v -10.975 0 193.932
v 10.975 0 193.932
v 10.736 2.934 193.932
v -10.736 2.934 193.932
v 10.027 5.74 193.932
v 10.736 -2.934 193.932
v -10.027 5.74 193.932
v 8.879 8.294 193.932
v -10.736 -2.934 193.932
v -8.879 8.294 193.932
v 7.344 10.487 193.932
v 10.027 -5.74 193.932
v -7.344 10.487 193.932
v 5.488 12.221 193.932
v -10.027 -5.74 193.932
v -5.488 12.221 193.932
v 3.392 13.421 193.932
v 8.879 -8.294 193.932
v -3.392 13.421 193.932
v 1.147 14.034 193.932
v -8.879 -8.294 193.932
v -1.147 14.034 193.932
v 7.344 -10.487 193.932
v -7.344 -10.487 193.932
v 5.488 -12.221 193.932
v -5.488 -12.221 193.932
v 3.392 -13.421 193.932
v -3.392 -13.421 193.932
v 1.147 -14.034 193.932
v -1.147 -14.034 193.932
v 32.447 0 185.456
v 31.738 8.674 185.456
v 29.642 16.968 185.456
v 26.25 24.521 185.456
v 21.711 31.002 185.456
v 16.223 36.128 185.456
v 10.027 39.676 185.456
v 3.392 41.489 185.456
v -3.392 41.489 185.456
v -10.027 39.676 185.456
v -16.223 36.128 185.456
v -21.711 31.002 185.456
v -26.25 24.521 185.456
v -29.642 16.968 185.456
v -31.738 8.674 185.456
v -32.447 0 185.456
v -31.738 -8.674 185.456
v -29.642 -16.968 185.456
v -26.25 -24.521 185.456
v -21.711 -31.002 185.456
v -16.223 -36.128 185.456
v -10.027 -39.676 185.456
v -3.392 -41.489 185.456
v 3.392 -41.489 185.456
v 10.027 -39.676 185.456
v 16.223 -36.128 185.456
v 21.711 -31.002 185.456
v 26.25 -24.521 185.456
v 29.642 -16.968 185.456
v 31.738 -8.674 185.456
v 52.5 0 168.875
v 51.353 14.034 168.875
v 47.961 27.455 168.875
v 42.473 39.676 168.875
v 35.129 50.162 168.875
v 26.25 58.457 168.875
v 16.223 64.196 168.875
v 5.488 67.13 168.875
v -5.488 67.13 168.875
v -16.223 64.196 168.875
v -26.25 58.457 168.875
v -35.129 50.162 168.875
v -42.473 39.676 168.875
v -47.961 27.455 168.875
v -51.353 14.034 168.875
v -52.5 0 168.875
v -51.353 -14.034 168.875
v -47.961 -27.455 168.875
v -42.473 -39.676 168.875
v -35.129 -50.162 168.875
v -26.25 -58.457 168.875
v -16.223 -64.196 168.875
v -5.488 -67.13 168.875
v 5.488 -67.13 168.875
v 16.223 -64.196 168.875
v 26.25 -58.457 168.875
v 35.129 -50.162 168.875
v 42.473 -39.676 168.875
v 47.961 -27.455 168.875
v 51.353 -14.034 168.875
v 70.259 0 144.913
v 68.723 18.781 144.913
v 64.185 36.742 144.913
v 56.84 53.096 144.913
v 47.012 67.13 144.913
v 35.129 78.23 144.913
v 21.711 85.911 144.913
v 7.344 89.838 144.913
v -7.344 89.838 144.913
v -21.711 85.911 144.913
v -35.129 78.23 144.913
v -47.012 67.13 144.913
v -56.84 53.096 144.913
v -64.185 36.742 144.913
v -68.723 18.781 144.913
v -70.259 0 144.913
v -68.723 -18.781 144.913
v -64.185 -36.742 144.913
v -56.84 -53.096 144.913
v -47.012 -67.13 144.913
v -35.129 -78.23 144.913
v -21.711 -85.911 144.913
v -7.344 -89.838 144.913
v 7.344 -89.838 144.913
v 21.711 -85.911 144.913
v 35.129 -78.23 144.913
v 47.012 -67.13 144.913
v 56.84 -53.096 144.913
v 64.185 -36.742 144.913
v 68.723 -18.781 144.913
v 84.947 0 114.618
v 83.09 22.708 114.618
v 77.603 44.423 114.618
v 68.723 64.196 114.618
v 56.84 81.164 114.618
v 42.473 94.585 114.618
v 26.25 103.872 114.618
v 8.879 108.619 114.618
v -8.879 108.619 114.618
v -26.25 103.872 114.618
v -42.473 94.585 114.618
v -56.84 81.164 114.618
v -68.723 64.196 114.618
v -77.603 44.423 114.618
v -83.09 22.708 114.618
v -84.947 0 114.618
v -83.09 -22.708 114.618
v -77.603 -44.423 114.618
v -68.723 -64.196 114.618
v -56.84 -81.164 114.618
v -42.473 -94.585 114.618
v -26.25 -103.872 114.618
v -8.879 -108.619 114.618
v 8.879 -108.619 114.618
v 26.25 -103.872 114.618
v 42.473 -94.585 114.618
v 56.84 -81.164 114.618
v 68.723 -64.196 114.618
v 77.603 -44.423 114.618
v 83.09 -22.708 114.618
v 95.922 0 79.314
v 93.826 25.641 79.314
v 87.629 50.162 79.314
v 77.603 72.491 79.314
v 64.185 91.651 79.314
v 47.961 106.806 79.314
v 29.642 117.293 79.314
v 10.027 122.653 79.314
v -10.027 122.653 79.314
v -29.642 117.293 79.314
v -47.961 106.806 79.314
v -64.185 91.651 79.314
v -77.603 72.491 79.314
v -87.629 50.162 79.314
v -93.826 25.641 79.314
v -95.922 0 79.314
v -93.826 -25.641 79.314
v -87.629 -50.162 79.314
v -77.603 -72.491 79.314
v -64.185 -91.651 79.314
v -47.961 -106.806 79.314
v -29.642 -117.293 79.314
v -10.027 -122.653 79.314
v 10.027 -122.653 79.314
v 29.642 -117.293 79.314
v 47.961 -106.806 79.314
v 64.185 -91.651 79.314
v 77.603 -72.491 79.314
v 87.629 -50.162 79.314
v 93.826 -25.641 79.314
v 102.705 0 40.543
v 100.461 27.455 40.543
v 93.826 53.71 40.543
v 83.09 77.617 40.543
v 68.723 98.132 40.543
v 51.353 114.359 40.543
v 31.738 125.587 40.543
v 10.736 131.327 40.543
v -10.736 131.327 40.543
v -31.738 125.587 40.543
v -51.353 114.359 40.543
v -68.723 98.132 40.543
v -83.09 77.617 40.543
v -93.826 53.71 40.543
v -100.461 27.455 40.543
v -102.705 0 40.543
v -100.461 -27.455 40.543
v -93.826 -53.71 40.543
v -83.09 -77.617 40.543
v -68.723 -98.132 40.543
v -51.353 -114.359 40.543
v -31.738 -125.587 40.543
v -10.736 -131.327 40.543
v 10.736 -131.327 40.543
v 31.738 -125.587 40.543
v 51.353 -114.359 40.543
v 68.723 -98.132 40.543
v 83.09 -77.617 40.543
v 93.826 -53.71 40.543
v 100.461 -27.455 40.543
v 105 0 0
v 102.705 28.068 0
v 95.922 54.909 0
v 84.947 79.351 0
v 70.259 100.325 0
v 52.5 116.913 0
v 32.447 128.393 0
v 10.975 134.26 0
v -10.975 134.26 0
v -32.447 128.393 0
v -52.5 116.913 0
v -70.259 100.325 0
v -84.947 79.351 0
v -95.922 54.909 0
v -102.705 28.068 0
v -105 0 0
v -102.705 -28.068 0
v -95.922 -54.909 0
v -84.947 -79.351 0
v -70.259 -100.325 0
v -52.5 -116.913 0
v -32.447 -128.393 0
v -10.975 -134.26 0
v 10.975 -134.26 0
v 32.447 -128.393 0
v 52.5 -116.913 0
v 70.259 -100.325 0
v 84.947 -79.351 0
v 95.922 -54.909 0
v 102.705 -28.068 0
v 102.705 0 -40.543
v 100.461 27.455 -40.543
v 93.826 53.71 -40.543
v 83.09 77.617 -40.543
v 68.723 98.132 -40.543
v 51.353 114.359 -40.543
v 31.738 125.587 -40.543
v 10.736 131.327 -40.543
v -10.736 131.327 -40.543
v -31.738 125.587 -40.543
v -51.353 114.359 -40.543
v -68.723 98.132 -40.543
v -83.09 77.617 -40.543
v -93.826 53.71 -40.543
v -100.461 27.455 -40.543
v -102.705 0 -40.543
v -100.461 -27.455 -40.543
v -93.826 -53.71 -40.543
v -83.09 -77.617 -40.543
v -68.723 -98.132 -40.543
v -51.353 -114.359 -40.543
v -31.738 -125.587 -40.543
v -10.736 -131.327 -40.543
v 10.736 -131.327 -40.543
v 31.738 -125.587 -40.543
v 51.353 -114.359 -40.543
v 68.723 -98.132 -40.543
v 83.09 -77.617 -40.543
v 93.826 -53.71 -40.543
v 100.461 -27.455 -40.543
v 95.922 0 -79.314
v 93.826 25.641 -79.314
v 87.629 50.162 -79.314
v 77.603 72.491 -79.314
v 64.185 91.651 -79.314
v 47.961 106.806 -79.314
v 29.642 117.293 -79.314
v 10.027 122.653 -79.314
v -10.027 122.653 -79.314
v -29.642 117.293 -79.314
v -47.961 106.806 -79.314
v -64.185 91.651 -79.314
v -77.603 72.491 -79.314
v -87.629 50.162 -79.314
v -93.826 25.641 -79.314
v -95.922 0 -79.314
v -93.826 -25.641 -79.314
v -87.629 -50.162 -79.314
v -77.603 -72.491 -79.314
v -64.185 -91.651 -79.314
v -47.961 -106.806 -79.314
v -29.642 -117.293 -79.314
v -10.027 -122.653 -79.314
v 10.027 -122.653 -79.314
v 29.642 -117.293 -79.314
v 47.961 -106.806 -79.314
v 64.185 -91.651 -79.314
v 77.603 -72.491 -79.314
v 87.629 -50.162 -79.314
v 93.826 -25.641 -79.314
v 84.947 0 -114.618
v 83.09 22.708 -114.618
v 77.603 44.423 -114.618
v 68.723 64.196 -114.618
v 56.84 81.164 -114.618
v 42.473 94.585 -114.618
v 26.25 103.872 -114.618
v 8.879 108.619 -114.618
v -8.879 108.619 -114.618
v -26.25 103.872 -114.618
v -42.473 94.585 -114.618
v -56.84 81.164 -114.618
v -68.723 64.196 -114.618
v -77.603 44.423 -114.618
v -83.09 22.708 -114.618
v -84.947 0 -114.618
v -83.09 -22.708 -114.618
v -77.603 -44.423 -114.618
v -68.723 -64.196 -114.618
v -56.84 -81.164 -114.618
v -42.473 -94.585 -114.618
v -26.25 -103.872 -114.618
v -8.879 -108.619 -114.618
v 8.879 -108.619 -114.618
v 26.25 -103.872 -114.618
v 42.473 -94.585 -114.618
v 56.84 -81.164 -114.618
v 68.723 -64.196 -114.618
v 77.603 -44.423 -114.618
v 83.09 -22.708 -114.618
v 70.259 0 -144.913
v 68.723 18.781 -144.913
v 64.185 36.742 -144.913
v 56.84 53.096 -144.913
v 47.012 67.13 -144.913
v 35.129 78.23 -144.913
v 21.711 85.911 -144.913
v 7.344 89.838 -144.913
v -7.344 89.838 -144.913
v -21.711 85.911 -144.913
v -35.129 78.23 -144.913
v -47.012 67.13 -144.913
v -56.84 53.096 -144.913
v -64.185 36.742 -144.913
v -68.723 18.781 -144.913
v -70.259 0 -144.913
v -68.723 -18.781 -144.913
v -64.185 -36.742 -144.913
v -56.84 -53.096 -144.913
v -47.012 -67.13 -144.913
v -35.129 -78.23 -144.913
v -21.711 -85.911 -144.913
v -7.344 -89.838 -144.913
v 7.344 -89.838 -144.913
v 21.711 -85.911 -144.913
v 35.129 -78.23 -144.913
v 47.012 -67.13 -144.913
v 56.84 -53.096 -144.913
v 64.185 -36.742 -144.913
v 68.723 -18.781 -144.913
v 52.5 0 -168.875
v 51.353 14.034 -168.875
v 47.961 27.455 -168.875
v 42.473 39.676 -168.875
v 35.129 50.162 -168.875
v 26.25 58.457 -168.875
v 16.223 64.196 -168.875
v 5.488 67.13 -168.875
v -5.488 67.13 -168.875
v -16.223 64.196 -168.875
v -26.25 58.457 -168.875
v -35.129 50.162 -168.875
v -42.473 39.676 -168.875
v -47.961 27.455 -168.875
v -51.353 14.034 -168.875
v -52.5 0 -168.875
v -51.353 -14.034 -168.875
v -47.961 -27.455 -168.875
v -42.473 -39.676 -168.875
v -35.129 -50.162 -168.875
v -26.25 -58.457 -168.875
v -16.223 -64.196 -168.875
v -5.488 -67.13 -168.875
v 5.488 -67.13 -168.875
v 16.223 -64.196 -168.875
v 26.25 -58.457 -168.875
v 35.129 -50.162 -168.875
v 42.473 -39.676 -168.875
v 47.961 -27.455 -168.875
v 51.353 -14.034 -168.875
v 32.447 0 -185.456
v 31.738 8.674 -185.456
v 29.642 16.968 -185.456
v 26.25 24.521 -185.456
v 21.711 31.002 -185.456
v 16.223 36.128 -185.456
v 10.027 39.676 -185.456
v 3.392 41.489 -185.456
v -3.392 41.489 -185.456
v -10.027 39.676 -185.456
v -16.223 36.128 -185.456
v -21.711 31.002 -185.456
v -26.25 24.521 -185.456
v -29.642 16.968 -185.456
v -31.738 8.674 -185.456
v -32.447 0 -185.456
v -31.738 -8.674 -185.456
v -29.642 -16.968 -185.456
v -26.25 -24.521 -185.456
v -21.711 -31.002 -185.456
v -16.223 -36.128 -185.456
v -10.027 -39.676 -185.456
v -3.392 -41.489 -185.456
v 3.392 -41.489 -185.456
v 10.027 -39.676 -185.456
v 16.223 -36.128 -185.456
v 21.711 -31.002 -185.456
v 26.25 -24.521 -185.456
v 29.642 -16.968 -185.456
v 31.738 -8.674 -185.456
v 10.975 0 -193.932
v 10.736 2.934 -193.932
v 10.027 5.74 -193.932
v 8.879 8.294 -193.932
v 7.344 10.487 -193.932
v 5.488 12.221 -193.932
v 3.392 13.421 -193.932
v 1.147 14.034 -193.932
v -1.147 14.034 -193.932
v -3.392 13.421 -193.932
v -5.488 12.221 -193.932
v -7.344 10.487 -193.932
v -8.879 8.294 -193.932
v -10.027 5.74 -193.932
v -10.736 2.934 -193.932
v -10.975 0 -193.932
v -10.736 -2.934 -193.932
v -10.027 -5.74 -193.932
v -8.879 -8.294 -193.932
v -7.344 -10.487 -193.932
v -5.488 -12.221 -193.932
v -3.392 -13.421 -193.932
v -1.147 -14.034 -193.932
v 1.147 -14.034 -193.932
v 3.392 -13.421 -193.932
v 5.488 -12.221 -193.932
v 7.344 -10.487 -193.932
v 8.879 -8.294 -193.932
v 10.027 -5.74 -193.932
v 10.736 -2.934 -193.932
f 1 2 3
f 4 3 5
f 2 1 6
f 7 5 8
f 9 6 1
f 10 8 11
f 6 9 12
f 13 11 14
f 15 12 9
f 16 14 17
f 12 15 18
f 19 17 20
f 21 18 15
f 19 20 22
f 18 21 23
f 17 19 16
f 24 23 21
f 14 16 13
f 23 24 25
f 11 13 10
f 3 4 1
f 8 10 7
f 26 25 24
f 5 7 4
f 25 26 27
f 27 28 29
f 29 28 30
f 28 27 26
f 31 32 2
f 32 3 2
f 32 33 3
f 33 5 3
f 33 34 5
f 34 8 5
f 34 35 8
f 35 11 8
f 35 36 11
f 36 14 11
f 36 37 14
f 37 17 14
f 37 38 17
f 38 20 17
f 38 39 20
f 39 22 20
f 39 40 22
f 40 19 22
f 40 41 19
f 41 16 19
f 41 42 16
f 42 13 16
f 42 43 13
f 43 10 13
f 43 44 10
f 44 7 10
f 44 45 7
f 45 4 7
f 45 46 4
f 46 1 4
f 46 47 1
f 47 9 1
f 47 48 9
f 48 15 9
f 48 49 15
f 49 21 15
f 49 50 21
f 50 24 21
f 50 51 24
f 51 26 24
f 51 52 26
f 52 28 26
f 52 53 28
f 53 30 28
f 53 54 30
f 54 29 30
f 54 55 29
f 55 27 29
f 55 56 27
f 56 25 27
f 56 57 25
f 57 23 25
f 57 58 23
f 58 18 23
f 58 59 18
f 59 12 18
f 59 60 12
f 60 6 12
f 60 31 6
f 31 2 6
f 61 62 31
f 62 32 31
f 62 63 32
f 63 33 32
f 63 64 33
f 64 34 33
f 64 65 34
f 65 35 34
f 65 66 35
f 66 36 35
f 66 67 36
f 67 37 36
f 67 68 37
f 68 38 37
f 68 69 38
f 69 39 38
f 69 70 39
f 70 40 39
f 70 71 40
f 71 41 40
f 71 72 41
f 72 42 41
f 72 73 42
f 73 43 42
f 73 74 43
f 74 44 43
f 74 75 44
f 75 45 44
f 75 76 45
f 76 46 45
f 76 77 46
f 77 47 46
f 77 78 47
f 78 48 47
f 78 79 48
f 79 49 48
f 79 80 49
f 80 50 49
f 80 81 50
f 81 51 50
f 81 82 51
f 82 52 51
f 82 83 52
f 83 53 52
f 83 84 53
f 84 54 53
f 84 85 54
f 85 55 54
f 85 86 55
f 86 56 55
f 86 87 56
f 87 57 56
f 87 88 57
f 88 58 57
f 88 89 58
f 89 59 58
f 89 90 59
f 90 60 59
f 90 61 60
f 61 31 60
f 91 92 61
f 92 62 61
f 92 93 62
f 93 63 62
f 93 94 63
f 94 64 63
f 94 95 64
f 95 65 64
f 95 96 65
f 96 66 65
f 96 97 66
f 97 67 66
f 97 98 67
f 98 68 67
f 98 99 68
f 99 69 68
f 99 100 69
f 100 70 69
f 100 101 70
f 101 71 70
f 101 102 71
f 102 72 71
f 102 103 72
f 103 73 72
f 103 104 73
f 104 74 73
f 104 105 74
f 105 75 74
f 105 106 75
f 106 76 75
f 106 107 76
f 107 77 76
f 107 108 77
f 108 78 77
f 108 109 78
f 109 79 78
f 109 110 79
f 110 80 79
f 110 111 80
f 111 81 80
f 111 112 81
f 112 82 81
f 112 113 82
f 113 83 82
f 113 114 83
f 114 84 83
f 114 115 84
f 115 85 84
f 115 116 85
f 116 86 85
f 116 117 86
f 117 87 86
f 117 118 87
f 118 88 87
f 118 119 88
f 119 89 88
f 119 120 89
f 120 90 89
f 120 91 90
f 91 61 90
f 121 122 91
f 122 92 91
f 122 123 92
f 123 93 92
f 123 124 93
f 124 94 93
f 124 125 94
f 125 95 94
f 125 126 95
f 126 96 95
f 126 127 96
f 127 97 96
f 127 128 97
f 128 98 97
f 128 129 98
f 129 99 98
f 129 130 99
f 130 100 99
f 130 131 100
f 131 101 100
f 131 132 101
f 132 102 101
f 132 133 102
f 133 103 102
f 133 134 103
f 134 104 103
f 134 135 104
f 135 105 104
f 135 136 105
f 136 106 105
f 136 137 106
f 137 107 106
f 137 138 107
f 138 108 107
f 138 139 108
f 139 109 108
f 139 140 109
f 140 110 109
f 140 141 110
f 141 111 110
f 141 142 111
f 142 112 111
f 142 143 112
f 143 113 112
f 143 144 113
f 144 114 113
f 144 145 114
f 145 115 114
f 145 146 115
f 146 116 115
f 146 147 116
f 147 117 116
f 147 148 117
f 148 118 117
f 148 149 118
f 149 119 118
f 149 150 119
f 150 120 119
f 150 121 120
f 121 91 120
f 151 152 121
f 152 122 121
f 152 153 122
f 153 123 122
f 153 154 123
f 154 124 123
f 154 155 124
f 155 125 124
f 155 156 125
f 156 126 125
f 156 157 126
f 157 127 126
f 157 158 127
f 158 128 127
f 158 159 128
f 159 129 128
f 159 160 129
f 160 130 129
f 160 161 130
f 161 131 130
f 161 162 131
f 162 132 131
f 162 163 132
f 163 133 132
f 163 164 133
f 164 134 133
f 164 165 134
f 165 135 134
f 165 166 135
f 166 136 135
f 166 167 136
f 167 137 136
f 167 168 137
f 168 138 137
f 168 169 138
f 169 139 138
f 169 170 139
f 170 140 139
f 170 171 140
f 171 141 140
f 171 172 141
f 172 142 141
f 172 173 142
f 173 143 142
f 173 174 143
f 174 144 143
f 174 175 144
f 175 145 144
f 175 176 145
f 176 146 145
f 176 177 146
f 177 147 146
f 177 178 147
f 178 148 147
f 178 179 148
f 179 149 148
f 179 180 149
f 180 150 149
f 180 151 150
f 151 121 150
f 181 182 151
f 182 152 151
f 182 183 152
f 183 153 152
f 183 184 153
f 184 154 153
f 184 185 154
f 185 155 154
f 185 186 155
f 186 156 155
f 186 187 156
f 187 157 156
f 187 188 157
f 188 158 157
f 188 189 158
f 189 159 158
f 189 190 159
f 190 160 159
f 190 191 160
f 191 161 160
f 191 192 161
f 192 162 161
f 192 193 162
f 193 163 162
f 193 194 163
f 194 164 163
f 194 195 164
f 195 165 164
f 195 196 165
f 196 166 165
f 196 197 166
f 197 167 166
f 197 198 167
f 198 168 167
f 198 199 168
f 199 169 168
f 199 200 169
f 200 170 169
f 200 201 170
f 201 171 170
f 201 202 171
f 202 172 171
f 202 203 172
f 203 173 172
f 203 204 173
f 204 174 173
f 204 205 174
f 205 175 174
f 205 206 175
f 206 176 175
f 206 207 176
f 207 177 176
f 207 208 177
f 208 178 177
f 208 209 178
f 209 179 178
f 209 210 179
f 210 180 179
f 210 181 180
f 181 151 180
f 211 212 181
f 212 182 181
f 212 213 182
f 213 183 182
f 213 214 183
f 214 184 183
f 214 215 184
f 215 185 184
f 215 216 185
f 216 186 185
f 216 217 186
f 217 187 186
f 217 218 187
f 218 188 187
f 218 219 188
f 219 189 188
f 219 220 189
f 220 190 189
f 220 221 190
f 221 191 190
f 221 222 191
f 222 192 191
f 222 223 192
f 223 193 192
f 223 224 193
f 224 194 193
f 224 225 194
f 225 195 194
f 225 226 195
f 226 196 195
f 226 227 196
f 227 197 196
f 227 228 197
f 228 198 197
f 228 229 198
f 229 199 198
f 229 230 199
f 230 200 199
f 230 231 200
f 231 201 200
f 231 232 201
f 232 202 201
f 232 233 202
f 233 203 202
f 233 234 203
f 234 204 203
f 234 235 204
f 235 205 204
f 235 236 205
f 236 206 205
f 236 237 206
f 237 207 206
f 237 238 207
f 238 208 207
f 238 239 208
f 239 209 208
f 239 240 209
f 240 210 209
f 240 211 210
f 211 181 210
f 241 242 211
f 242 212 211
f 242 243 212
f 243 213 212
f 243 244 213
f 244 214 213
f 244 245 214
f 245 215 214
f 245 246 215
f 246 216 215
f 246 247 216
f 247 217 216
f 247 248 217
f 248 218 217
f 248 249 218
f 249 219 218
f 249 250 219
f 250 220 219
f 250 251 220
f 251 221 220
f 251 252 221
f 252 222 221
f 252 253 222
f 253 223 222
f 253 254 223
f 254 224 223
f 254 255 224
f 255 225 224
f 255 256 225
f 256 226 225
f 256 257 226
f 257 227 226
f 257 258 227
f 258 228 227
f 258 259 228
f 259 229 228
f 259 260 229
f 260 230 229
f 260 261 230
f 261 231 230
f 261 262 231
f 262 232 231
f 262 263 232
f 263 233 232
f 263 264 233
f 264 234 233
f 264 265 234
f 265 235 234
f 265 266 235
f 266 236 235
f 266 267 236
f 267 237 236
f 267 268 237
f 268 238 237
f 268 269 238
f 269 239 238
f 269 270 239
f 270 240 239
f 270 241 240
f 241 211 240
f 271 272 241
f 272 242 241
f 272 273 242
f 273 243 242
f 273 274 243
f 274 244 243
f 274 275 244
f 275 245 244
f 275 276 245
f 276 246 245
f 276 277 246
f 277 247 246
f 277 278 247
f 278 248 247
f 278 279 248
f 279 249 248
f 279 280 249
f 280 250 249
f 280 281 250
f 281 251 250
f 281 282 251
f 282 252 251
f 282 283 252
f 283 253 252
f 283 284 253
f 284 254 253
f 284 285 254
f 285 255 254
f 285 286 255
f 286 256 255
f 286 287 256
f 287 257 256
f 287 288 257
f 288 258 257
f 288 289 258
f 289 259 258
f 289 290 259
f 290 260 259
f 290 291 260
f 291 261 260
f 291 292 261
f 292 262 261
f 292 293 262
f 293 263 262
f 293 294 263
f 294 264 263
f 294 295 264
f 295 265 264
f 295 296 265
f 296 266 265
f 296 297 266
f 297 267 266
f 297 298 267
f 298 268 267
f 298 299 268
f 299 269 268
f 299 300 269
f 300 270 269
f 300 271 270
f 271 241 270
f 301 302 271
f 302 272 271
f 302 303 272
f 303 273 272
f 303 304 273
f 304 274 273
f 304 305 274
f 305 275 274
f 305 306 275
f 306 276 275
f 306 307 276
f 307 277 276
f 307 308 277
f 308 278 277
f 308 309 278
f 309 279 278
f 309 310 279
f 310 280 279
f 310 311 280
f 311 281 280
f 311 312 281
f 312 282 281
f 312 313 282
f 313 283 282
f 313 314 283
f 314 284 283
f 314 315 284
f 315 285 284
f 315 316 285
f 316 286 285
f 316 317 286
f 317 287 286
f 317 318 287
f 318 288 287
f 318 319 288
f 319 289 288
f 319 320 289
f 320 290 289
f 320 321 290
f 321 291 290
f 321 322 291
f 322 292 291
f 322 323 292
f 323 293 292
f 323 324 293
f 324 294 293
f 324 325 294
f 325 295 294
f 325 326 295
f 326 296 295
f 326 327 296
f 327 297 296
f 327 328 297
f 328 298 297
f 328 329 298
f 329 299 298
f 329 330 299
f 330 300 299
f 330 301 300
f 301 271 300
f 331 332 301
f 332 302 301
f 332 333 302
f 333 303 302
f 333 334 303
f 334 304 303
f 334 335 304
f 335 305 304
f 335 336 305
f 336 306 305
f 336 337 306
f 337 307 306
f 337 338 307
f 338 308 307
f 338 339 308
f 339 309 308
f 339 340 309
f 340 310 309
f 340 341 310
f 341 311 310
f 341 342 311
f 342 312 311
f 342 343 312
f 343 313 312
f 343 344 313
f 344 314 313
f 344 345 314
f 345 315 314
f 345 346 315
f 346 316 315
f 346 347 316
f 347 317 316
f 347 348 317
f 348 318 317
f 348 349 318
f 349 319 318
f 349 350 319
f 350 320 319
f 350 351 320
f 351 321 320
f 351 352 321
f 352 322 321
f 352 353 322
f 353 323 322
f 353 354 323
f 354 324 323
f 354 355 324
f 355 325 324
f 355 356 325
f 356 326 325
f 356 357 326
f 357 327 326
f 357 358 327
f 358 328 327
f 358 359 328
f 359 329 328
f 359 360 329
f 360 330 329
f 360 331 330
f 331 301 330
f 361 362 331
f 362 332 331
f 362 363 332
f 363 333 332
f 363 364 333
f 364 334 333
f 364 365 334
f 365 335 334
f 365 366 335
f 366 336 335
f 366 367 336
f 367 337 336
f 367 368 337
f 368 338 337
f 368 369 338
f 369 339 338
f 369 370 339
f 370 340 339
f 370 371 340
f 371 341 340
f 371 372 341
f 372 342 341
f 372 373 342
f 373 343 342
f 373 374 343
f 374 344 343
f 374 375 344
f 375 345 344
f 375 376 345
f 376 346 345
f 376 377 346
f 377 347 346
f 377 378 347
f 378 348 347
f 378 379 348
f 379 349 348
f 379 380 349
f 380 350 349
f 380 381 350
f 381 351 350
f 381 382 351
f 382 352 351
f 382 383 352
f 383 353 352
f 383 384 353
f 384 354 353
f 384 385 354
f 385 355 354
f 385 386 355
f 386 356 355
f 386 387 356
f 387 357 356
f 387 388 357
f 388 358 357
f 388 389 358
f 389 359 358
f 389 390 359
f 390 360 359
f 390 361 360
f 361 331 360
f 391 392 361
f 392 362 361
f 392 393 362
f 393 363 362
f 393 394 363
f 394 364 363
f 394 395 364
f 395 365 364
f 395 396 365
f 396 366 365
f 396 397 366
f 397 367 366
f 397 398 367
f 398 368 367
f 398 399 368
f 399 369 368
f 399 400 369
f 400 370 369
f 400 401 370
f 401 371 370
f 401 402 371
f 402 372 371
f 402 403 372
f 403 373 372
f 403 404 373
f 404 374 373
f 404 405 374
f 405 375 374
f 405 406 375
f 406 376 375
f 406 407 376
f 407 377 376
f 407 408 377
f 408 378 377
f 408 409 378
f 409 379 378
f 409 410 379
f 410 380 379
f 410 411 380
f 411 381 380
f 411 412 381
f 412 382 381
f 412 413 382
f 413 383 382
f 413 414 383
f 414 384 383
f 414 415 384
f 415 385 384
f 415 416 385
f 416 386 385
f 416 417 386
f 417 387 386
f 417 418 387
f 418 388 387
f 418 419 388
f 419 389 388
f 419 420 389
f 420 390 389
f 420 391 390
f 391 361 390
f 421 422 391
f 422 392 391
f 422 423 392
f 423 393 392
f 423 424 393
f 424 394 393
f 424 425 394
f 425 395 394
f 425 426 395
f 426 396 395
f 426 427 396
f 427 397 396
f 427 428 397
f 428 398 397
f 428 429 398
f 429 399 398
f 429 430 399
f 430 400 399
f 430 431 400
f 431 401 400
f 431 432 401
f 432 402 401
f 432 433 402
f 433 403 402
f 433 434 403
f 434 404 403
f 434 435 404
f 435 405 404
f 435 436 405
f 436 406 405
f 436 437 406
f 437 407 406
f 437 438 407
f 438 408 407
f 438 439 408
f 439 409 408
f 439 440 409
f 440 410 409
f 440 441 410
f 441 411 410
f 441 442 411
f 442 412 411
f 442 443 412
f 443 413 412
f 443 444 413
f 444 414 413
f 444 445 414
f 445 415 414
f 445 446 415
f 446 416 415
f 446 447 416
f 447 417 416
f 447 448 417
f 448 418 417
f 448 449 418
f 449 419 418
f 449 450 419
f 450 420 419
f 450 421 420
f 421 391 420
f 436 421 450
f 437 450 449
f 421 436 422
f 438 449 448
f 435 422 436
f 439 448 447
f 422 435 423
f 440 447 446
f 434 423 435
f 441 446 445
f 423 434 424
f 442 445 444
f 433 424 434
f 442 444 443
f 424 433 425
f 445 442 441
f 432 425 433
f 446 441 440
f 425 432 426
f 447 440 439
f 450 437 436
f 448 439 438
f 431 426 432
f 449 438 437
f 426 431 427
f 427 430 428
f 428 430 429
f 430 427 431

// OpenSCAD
// Generated by SolidPython 1.0.1 on 2020-07-29 00:46:47


scale(v = [7, 9, 13]) {
	sphere(r = 15);
}
/***********************************************
*********      SolidPython code:      **********
************************************************
 
# import packages: SolidPython
from solid import *
from solid.utils import *
from itertools import chain, combinations, permutations


class Resize:

    def __init__(self, scad_file):
        self.scad_file = scad_file
        #self.scad_file = import_scad(scad_file)
        # cone/cylinder param:
        self.r1 = 0
        self.r2 = 0
        self.h = 0
        # rectangular prism param:
        self.w = 0
        self.l = 0
        # ellipse param:
        self.r = 0

    # import OpenScad code (file name corresponds to shape)


    # classify shape + parameters
    def assign(self, param1, param2, param3):
        if self.scad_file == 'cone.scad':
            self.r1 = param1
            self.r2 = param2
            self.h = param3
        elif self.scad_file == 'cylinder.scad':
            self.r1 = param1
            self.r2 = param2
            self.h = param3
        elif self.scad_file == 'rectangularPrism.scad':
            self.h = param1
            self.l = param2
            self.w = param3
        else:
            self.r = param1
            self.h = param2

    # resize parameters
    def iterate(self):
        x = range(3, 20, 2)
        i = 1
        if self.scad_file == 'cone.scad':
            tempList = list(permutations(x, 2))
            for temp in tempList:
                param1 = temp[0]
                param2 = temp[1]
                filepath = 'produced_scad_files/' + 'cone' + str(param1) + '_' + str(param2) + '_' + '.scad'
                scad_render_to_file(cylinder(h=param1, r1=param2, r2=0), filepath)

        elif self.scad_file == 'cylinder.scad':
            tempList = list(permutations(x, 3))
            for temp in tempList:
                param1 = temp[0]
                param2 = temp[1]
                filepath = 'produced_scad_files/' + 'cylinder' + str(param1) + '_' + str(param2) + '_' + '.scad'
                scad_render_to_file(cylinder(h=param1, r1=param2, r2=param2), filepath)

        elif self.scad_file == 'rectangularPrism.scad':
            tempList = list(permutations(x, 3))
            for temp in tempList:
                param1 = temp[0]
                param2 = temp[1]
                param3 = temp[2]
                filepath = 'produced_scad_files/' + 'rectangularPrism' + str(param1) + '_' + str(param2) + '_' + str(
                    param3) + '.scad'
                scad_render_to_file(cube(size=(param1, param2, param3)), filepath)

        elif self.scad_file == 'ellipse.scad':
            tempList = list(permutations(x, 4))
            for temp in tempList:
                param1 = temp[0]
                param2 = temp[1]
                param3 = temp[2]
                param4 = temp[3]
                filepath = 'produced_scad_files/' + 'ellipse' + str(param1) + '_' + str(param2) + '_' + str(param3) + '_' + str(param4) + '.scad'
                scad_render_to_file(scale([param1, param2, param3])(sphere(r=param4)), filepath)

    def render_to_scadfile(self):
        scad_render_to_file(scad, 'example.scad') 
 
************************************************/
